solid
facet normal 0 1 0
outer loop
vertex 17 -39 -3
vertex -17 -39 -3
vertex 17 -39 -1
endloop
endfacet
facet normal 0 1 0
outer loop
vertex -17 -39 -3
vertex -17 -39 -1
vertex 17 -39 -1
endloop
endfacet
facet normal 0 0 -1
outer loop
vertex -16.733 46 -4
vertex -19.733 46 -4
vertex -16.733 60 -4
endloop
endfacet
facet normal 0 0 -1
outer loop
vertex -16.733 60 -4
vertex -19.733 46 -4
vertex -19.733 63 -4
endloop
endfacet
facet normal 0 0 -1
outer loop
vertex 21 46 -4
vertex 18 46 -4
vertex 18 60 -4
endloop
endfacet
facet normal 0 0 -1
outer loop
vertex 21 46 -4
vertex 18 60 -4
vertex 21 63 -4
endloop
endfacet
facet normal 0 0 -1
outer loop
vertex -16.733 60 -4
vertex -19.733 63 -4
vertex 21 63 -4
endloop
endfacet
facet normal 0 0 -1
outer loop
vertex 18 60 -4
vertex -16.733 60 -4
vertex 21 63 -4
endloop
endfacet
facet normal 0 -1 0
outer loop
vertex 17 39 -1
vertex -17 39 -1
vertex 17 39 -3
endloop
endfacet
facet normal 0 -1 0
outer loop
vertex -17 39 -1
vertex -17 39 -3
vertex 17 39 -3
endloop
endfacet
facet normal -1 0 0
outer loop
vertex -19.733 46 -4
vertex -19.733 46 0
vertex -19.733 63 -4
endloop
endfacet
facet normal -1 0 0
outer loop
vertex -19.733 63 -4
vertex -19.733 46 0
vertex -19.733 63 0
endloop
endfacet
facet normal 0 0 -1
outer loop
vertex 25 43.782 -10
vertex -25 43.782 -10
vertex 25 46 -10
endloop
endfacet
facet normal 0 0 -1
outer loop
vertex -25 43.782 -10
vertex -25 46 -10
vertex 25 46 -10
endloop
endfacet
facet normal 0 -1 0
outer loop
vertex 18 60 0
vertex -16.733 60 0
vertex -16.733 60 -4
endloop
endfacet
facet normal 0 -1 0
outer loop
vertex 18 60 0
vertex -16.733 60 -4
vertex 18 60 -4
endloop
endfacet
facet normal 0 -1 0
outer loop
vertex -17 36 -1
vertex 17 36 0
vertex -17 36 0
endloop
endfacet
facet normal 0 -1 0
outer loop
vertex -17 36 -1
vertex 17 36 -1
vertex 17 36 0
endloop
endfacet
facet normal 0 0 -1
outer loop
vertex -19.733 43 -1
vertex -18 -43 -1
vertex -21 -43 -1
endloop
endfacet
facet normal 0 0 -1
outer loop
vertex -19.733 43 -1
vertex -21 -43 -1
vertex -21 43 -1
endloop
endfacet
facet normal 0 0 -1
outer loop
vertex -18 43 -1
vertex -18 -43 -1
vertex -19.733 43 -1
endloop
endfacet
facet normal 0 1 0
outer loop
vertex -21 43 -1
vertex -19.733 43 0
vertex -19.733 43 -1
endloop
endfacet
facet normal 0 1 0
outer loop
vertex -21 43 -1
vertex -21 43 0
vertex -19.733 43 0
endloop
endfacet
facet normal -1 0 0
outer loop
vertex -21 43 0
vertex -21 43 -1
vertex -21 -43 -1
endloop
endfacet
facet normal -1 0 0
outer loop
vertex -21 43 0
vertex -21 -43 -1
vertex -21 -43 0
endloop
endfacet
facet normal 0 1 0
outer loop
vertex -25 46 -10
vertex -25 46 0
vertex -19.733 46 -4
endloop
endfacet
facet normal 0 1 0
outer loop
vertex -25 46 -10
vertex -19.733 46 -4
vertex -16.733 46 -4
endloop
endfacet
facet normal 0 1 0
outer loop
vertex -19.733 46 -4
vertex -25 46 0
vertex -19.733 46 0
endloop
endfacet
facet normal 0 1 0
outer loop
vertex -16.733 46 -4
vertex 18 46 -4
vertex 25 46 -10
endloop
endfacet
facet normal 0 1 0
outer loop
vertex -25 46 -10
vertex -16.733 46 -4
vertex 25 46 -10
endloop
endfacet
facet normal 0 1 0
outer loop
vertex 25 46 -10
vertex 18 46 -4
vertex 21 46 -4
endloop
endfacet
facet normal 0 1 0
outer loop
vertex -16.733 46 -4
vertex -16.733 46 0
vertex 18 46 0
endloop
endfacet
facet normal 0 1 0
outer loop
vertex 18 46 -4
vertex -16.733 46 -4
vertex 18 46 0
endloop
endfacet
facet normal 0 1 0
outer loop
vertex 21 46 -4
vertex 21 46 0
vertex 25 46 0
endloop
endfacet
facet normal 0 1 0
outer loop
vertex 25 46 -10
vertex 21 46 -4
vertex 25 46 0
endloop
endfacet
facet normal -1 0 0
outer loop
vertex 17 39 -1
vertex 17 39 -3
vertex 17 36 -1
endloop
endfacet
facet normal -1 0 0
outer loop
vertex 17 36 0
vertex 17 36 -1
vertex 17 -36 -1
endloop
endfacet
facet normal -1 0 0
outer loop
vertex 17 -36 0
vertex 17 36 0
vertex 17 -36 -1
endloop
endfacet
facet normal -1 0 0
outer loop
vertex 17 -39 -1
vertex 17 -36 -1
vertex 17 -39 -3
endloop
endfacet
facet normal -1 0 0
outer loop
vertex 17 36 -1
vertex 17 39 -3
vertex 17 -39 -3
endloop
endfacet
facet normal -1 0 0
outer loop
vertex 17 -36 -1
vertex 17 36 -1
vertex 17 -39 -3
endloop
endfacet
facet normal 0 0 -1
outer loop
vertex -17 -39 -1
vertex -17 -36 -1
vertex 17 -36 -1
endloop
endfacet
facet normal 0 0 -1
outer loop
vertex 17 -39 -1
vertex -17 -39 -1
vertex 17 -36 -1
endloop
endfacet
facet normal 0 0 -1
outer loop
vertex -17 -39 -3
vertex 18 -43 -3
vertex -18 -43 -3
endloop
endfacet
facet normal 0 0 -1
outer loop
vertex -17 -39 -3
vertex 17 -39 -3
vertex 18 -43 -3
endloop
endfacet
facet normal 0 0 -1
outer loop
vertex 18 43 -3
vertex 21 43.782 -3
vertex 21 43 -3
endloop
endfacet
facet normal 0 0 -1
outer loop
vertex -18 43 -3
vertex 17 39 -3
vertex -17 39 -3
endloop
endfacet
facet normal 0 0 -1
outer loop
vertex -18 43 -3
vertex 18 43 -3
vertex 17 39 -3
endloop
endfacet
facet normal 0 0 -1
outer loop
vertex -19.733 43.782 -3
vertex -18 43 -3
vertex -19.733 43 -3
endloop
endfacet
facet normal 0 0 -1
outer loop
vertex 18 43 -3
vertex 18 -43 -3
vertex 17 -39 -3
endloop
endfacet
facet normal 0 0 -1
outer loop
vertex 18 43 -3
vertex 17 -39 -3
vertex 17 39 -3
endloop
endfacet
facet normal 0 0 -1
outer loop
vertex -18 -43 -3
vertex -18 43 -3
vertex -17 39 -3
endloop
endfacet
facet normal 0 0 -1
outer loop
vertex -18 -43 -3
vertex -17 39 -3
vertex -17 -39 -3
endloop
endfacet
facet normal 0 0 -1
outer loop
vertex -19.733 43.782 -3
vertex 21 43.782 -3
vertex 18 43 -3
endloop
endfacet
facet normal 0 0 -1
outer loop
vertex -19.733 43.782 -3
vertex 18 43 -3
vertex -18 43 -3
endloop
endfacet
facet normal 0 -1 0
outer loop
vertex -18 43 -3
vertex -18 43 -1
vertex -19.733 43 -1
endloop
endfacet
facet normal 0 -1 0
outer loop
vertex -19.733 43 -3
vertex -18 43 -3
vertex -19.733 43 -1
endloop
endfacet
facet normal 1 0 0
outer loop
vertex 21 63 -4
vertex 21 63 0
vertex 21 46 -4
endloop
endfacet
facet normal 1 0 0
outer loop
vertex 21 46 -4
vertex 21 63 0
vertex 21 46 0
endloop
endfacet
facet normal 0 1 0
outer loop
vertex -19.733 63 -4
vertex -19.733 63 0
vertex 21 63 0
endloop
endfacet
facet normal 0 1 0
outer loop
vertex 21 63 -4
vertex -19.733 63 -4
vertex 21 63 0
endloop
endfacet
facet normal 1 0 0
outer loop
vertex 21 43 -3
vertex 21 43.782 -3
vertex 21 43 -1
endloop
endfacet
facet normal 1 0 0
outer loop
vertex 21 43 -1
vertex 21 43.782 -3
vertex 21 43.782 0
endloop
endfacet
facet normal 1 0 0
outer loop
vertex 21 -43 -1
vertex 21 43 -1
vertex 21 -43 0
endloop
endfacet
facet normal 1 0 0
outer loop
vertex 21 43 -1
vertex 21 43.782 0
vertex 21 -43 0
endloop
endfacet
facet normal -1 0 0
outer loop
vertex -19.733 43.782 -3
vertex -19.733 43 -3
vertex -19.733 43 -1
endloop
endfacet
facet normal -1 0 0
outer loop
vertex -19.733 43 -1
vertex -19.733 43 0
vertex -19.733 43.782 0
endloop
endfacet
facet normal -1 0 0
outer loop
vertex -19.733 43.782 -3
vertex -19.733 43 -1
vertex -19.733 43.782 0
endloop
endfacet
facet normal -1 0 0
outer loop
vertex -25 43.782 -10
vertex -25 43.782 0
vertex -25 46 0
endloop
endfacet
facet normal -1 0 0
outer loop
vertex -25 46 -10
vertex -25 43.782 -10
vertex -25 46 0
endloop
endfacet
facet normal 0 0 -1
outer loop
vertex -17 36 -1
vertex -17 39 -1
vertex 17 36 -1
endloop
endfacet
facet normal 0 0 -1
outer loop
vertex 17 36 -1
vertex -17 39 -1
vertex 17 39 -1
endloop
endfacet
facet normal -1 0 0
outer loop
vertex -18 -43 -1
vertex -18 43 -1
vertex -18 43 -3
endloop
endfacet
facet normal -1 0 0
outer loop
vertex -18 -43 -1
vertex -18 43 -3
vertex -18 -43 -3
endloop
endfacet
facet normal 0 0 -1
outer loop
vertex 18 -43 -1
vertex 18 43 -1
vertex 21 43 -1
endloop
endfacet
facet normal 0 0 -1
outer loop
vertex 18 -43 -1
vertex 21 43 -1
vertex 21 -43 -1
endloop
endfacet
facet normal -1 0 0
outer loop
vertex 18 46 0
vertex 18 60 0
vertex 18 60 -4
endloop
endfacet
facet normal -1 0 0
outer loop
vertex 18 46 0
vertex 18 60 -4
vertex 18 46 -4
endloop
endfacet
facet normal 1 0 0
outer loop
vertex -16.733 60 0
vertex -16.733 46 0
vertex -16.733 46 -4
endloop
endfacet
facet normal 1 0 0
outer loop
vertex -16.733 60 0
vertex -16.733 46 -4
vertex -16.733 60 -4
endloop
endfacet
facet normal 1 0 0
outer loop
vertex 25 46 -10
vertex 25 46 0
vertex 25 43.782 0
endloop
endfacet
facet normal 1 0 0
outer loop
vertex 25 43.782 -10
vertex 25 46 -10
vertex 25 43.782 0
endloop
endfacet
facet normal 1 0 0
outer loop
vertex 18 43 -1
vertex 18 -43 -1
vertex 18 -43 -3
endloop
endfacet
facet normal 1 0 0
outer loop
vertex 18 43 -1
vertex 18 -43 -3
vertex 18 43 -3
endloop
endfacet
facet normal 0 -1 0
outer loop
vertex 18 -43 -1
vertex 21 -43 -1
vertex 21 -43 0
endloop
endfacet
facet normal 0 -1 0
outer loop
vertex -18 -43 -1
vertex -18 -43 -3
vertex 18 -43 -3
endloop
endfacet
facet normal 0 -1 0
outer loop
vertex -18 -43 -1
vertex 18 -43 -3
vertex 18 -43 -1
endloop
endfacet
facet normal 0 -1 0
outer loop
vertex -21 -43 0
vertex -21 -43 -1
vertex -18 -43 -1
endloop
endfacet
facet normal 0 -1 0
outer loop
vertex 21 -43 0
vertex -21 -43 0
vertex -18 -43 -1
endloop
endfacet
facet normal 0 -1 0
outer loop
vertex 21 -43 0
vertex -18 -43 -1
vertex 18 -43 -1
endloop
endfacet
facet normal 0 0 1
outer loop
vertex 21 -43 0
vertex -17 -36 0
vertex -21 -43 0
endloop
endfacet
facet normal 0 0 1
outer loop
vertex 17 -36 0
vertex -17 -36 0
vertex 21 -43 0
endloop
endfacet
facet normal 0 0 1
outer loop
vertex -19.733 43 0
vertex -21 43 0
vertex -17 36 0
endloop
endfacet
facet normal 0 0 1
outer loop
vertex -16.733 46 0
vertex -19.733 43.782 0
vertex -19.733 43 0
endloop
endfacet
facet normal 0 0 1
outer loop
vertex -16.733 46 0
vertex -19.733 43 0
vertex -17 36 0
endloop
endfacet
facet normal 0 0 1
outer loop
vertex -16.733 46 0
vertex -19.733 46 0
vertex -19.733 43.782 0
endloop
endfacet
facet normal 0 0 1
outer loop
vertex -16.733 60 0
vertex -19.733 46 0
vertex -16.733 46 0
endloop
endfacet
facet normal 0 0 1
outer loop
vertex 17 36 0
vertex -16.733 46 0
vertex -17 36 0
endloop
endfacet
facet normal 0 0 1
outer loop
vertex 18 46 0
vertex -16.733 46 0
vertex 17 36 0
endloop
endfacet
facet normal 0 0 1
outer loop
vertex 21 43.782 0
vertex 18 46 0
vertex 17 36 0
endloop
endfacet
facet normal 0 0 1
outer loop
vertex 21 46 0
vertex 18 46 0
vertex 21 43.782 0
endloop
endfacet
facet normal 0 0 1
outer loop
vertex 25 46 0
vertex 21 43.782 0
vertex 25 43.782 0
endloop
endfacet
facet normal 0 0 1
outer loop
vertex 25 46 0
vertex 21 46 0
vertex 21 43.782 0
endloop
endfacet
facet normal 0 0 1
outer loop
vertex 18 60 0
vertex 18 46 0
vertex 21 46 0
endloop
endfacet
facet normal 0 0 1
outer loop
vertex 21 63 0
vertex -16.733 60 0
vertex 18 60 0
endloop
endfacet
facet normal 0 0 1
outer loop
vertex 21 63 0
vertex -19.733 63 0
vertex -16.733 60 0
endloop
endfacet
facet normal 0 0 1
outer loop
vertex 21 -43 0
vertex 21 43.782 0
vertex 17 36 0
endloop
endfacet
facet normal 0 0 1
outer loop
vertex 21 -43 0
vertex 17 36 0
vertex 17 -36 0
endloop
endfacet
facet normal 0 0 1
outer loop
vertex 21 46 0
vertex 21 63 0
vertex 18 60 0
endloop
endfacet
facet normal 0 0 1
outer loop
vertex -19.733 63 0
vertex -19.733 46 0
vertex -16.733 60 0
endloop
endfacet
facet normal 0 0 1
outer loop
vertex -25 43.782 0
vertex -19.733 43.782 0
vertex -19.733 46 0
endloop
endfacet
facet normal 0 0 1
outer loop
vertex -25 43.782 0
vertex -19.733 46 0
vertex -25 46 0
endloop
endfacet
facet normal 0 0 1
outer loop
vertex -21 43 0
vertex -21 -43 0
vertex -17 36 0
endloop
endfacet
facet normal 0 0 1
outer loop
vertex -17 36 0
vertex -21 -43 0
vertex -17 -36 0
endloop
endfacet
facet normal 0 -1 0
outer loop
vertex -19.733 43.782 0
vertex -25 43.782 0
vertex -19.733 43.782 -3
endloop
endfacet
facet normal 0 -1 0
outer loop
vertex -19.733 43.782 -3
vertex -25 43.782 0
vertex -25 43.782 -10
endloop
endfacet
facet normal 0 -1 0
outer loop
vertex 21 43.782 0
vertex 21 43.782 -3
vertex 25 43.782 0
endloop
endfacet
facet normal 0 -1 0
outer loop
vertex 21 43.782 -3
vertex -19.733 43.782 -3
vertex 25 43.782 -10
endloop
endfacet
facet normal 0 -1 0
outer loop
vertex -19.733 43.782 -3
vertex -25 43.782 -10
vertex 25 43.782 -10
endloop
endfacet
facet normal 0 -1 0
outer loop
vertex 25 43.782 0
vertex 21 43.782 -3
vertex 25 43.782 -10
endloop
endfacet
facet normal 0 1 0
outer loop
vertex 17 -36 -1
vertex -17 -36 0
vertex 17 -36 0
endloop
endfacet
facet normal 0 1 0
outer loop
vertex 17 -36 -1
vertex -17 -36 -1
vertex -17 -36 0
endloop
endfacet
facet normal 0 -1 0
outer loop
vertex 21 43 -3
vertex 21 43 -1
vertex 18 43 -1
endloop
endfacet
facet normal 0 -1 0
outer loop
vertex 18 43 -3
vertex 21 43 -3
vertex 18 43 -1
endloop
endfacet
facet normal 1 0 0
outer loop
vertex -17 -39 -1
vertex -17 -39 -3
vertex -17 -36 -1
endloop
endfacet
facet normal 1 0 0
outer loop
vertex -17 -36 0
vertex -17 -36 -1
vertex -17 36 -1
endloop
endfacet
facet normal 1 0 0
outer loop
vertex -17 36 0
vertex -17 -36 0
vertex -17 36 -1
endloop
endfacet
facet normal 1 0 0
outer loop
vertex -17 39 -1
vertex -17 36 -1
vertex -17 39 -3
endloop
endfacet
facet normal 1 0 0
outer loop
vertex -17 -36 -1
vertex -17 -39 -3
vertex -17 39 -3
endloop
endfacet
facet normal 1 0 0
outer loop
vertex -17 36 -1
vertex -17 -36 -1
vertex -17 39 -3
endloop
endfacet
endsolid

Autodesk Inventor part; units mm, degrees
ref_plane "YZ Plane" through (0, 0, 0) normal (1, 0, 0) x (0, 1, 0)
ref_plane "XZ Plane" through (0, 0, 0) normal (0, 1, 0) x (-1, 0, 0)
ref_plane "XY Plane" through (0, 0, 0) normal (0, 0, 1) x (1, 0, 0)
ref_plane "Arbeitsebene1" through (-10.2983, 3.243, -1) normal (0, 0, -1) x (-1, 0, 0)
sketch "Skizze1" plane through (-10.2983, 3.243, -1) normal (0, 0, -1) x (-1, 0, 0)
  line L0 (2.7017, 34.757) -> (-23.2983, 34.757) projected
  line L1 (-23.2983, 34.757) -> (-23.2983, -41.243) projected
  line L2 (-23.2983, -41.243) -> (2.7017, -41.243) projected
  line L3 (2.7017, -41.243) -> (2.7017, 34.757) projected
  line L4 (3.7017, -42.243) -> (-24.2983, -42.243)
  line L5 (-24.2983, -42.243) -> (-24.2983, 35.757)
  line L6 (-24.2983, 35.757) -> (3.7017, 35.757)
  line L7 (3.7017, 35.757) -> (3.7017, -42.243)
  line L8 (7.7017, -46.243) -> (-28.2983, -46.243)
  line L9 (-28.2983, -46.243) -> (-28.2983, 39.757)
  line L10 (-28.2983, 39.757) -> (7.7017, 39.757)
  line L11 (7.7017, 39.757) -> (7.7017, -46.243)
  point P0 (-10.2983, -3.243)
  dimension "d1" = 4
  dimension "d39" = 36
extrude "Extrusion1" add sketch "Skizze1" along normal blind 3 contours L8 L9 L10 L11
sketch "Skizze2" plane through (-10.2983, 3.243, -1) normal (0, 0, 1) x (1, 0, 0)
  line L0 (24.2983, 35.757) -> (24.2983, -42.243) projected
  line L1 (24.2983, -42.243) -> (-3.7017, -42.243) projected
  line L2 (-3.7017, -42.243) -> (-3.7017, 35.757) projected
  line L3 (-3.7017, 35.757) -> (24.2983, 35.757) projected
  line L4 (-7.7017, -46.243) -> (28.2983, -46.243) projected
  line L5 (28.2983, -46.243) -> (28.2983, 39.757) projected
  line L6 (28.2983, 39.757) -> (-7.7017, 39.757) projected
  line L7 (-7.7017, 39.757) -> (-7.7017, -46.243) projected
  line L8 (22.2983, 33.757) -> (22.2983, -40.243)
  line L9 (22.2983, -40.243) -> (-1.7017, -40.243)
  line L10 (-1.7017, -40.243) -> (-1.7017, 33.757)
  line L11 (-1.7017, 33.757) -> (22.2983, 33.757)
  line L12 (21.2983, -39.243) -> (21.2983, 32.757)
  line L13 (21.2983, 32.757) -> (-0.7017, 32.757)
  line L14 (-0.7017, 32.757) -> (-0.7017, -39.243)
  line L15 (-0.7017, -39.243) -> (21.2983, -39.243)
  point P0 (10.2983, -3.243)
  dimension "d4" = 2
  dimension "d45" = 1
extrude "Extrusion2" add sketch "Skizze2" along normal blind 1 contours L0 L1 L2 L3 | L7 L6 L5 L4 | L8 L9 L10 L11
ref_plane "Arbeitsebene2" through (-18, -43, -2.5) normal (0, -1, 0) x (1, 0, 0)
sketch "Skizze9" plane through (-18, -43, -4) normal (-1, 0, 0) x (0, 0, 1)
  line L0 (0, 86) -> (4, 86) projected
  line L1 (0, 0) -> (0, 86) projected
  line L2 (4, 0) -> (0, 0) projected
  line L3 (4, 86) -> (4, 0) projected
  line L4 (4, 0) -> (3, 0)
  line L5 (3, 0) -> (3, 86)
  line L6 (3, 86) -> (4, 86)
  line L7 (4, 86) -> (4, 0)
  line L8 (4, 0) -> (3, 86) construction
  line L9 (3, 0) -> (4, 86) construction
  dimension "d27" = 1
extrude "Extrusion9" add sketch "Skizze9" along normal blind 3 contours L0 L3 L2 L5
sketch "Skizze10" plane through (18, -43, -4) normal (1, 0, 0) x (0, 0, -1)
  line L0 (-3, 86) -> (-3, 0) projected
  line L1 (-3, 0) -> (-4, 0) projected
  line L2 (-4, 0) -> (-4, 86) projected
  line L3 (-4, 86) -> (-3, 86) projected
  point P0 (-4, 43)
extrude "Extrusion10" add sketch "Skizze10" along normal blind 3
sketch "Skizze11" plane through (-10.2983, 3.243, 0) normal (0, 0, 1) x (1, 0, 0)
  line L0 (22.2983, -40.243) -> (-1.7017, -40.243) projected
  line L1 (-1.7017, -40.243) -> (-1.7017, 33.757) projected
  line L2 (-1.7017, 33.757) -> (22.2983, 33.757) projected
  line L3 (22.2983, 33.757) -> (22.2983, -40.243) projected
  line L4 (31.2983, 39.757) -> (-9.4351, 39.757)
  line L5 (-9.4351, 39.757) -> (-9.4351, 59.757)
  line L6 (-9.4351, 59.757) -> (31.2983, 59.757)
  line L7 (31.2983, 59.757) -> (31.2983, 39.757)
  line L8 (28.2983, 42.757) -> (-6.4351, 42.757)
  line L9 (-6.4351, 42.757) -> (-6.4351, 56.757)
  line L10 (-6.4351, 56.757) -> (28.2983, 56.757)
  line L11 (28.2983, 56.757) -> (28.2983, 42.757)
  point P0 (10.2983, -3.243)
  dimension "d32" = 20
  dimension "d33" = 3
extrude "Extrusion11" add sketch "Skizze11" against normal up to surface (4 mm away) contours L4 L5 L6 L7
sketch "Skizze12" plane through (-10.2983, 3.243, 0) normal (0, 0, 1) x (1, 0, 0)
  line L0 (28.2983, 56.757) -> (28.2983, 42.757) projected
  line L1 (28.2983, 42.757) -> (-6.4351, 42.757) projected
  line L2 (-6.4351, 42.757) -> (-6.4351, 56.757) projected
  line L3 (-6.4351, 56.757) -> (28.2983, 56.757) projected
  line L4 (31.2983, -46.243) -> (31.2983, 59.757) projected
  line L5 (31.2983, 59.757) -> (-9.4351, 59.757) projected
  line L6 (-9.4351, 59.757) -> (-9.4351, 39.757) projected
  line L7 (35.2983, 40.5388) -> (-14.7017, 40.5388)
  line L8 (-14.7017, 40.5388) -> (-14.7017, 42.757)
  line L9 (-14.7017, 42.757) -> (35.2983, 42.757)
  line L10 (35.2983, 42.757) -> (35.2983, 40.5388)
  line L11 (35.2983, 40.5388) -> (-14.7017, 42.757) construction
  line L12 (-14.7017, 40.5388) -> (35.2983, 42.757) construction
  line L13 (31.2983, -46.243) -> (-10.7017, -46.243) projected
  line L14 (-10.7017, 39.757) -> (-9.4351, 39.757) projected
  line L15 (-10.7017, -46.243) -> (-10.7017, 39.757) projected
  point P0 (10.2983, -3.243)
  point P1 (10.2983, 41.6479)
  dimension "d36" = 50
extrude "Extrusion12" add sketch "Skizze12" against normal blind 10 contours L9 L4 L7 L6 L1 | L9 L10 L7 L4 | L6 L7 L8 L9
sketch "Skizze13" plane through (-10.2983, 3.243, -4) normal (0, 0, -1) x (-1, 0, 0)
  line L0 (-24.2983, -42.243) -> (-24.2983, 35.757) projected
  line L1 (-24.2983, 35.757) -> (3.7017, 35.757) projected
  line L2 (3.7017, 35.757) -> (3.7017, -42.243) projected
  line L3 (3.7017, -42.243) -> (-24.2983, -42.243) projected
  line L4 (9.4351, 40.5388) -> (-31.2983, 40.5388) projected
  line L5 (-31.2983, 39.757) -> (-31.2983, 40.5388) projected
  line L6 (-28.2983, 39.757) -> (-31.2983, 39.757) projected
  line L7 (-28.2983, 39.757) -> (-28.2983, -46.243) projected
  line L8 (-28.2983, -46.243) -> (7.7017, -46.243) projected
  line L9 (7.7017, -46.243) -> (7.7017, 39.757) projected
  line L10 (9.4351, 39.757) -> (7.7017, 39.757) projected
  line L11 (9.4351, 40.5388) -> (9.4351, 39.757) projected
  line L12 (-27.2983, -42.243) -> (6.7017, -42.243)
  line L13 (6.7017, -42.243) -> (6.7017, 35.757)
  line L14 (6.7017, 35.757) -> (-27.2983, 35.757)
  line L15 (-27.2983, 35.757) -> (-27.2983, -42.243)
  line L16 (-27.2983, -42.243) -> (6.7017, 35.757) construction
  line L17 (6.7017, -42.243) -> (-27.2983, 35.757) construction
  point P0 (-10.2983, -3.243)
  dimension "d40" = 34
extrude "Extrusion13" cut sketch "Skizze13" against normal up to surface (3 mm away) contours L12 L15 L14 L0 | L2 L14 L13 L12
sketch "Skizze14" plane through (-10.2983, 3.243, -4) normal (0, 0, -1) x (-1, 0, 0)
  line L0 (6.7017, -42.243) -> (-27.2983, -42.243) projected
  line L1 (-27.2983, -42.243) -> (-27.2983, 35.757) projected
  line L2 (-27.2983, 35.757) -> (6.7017, 35.757) projected
  line L3 (6.7017, 35.757) -> (6.7017, -42.243) projected
  line L4 (9.4351, 40.5388) -> (-31.2983, 40.5388) projected
  line L5 (-31.2983, 39.757) -> (-31.2983, 40.5388) projected
  line L6 (-28.2983, 39.757) -> (-31.2983, 39.757) projected
  line L7 (-28.2983, 39.757) -> (-28.2983, -46.243) projected
  line L8 (-28.2983, -46.243) -> (7.7017, -46.243) projected
  line L9 (7.7017, -46.243) -> (7.7017, 39.757) projected
  line L10 (9.4351, 39.757) -> (7.7017, 39.757) projected
  line L11 (9.4351, 40.5388) -> (9.4351, 39.757) projected
  point P0 (-10.2983, -3.243)
extrude "Extrusion14" cut sketch "Skizze14" against normal blind 1
sketch "Skizze15" plane through (-10.2983, 3.243, -1) normal (0, 0, -1) x (-1, 0, 0)
  line L0 (0.7017, -39.243) -> (-21.2983, -39.243) projected
  line L1 (-21.2983, -39.243) -> (-21.2983, 32.757) projected
  line L2 (-21.2983, 32.757) -> (0.7017, 32.757) projected
  line L3 (0.7017, 32.757) -> (0.7017, -39.243) projected
  line L4 (-27.2983, -42.243) -> (6.7017, -42.243) projected
  line L5 (6.7017, -42.243) -> (6.7017, 35.757) projected
  line L6 (6.7017, 35.757) -> (-27.2983, 35.757) projected
  line L7 (-27.2983, 35.757) -> (-27.2983, -42.243) projected
  line L8 (6.7017, -39.243) -> (-27.2983, -39.243)
  line L9 (-27.2983, -39.243) -> (-27.2983, 32.757)
  line L10 (-27.2983, 32.757) -> (6.7017, 32.757)
  line L11 (6.7017, 32.757) -> (6.7017, -39.243)
  line L12 (6.7017, -39.243) -> (-27.2983, 32.757) construction
  line L13 (-27.2983, -39.243) -> (6.7017, 32.757) construction
  point P0 (-10.2983, -3.243)
extrude "Extrusion15" cut sketch "Skizze15" against normal through all contours L3 L10 L5 L8 | L8 L7 L10 L1
properties part number "41_Objektträger_Tray"
